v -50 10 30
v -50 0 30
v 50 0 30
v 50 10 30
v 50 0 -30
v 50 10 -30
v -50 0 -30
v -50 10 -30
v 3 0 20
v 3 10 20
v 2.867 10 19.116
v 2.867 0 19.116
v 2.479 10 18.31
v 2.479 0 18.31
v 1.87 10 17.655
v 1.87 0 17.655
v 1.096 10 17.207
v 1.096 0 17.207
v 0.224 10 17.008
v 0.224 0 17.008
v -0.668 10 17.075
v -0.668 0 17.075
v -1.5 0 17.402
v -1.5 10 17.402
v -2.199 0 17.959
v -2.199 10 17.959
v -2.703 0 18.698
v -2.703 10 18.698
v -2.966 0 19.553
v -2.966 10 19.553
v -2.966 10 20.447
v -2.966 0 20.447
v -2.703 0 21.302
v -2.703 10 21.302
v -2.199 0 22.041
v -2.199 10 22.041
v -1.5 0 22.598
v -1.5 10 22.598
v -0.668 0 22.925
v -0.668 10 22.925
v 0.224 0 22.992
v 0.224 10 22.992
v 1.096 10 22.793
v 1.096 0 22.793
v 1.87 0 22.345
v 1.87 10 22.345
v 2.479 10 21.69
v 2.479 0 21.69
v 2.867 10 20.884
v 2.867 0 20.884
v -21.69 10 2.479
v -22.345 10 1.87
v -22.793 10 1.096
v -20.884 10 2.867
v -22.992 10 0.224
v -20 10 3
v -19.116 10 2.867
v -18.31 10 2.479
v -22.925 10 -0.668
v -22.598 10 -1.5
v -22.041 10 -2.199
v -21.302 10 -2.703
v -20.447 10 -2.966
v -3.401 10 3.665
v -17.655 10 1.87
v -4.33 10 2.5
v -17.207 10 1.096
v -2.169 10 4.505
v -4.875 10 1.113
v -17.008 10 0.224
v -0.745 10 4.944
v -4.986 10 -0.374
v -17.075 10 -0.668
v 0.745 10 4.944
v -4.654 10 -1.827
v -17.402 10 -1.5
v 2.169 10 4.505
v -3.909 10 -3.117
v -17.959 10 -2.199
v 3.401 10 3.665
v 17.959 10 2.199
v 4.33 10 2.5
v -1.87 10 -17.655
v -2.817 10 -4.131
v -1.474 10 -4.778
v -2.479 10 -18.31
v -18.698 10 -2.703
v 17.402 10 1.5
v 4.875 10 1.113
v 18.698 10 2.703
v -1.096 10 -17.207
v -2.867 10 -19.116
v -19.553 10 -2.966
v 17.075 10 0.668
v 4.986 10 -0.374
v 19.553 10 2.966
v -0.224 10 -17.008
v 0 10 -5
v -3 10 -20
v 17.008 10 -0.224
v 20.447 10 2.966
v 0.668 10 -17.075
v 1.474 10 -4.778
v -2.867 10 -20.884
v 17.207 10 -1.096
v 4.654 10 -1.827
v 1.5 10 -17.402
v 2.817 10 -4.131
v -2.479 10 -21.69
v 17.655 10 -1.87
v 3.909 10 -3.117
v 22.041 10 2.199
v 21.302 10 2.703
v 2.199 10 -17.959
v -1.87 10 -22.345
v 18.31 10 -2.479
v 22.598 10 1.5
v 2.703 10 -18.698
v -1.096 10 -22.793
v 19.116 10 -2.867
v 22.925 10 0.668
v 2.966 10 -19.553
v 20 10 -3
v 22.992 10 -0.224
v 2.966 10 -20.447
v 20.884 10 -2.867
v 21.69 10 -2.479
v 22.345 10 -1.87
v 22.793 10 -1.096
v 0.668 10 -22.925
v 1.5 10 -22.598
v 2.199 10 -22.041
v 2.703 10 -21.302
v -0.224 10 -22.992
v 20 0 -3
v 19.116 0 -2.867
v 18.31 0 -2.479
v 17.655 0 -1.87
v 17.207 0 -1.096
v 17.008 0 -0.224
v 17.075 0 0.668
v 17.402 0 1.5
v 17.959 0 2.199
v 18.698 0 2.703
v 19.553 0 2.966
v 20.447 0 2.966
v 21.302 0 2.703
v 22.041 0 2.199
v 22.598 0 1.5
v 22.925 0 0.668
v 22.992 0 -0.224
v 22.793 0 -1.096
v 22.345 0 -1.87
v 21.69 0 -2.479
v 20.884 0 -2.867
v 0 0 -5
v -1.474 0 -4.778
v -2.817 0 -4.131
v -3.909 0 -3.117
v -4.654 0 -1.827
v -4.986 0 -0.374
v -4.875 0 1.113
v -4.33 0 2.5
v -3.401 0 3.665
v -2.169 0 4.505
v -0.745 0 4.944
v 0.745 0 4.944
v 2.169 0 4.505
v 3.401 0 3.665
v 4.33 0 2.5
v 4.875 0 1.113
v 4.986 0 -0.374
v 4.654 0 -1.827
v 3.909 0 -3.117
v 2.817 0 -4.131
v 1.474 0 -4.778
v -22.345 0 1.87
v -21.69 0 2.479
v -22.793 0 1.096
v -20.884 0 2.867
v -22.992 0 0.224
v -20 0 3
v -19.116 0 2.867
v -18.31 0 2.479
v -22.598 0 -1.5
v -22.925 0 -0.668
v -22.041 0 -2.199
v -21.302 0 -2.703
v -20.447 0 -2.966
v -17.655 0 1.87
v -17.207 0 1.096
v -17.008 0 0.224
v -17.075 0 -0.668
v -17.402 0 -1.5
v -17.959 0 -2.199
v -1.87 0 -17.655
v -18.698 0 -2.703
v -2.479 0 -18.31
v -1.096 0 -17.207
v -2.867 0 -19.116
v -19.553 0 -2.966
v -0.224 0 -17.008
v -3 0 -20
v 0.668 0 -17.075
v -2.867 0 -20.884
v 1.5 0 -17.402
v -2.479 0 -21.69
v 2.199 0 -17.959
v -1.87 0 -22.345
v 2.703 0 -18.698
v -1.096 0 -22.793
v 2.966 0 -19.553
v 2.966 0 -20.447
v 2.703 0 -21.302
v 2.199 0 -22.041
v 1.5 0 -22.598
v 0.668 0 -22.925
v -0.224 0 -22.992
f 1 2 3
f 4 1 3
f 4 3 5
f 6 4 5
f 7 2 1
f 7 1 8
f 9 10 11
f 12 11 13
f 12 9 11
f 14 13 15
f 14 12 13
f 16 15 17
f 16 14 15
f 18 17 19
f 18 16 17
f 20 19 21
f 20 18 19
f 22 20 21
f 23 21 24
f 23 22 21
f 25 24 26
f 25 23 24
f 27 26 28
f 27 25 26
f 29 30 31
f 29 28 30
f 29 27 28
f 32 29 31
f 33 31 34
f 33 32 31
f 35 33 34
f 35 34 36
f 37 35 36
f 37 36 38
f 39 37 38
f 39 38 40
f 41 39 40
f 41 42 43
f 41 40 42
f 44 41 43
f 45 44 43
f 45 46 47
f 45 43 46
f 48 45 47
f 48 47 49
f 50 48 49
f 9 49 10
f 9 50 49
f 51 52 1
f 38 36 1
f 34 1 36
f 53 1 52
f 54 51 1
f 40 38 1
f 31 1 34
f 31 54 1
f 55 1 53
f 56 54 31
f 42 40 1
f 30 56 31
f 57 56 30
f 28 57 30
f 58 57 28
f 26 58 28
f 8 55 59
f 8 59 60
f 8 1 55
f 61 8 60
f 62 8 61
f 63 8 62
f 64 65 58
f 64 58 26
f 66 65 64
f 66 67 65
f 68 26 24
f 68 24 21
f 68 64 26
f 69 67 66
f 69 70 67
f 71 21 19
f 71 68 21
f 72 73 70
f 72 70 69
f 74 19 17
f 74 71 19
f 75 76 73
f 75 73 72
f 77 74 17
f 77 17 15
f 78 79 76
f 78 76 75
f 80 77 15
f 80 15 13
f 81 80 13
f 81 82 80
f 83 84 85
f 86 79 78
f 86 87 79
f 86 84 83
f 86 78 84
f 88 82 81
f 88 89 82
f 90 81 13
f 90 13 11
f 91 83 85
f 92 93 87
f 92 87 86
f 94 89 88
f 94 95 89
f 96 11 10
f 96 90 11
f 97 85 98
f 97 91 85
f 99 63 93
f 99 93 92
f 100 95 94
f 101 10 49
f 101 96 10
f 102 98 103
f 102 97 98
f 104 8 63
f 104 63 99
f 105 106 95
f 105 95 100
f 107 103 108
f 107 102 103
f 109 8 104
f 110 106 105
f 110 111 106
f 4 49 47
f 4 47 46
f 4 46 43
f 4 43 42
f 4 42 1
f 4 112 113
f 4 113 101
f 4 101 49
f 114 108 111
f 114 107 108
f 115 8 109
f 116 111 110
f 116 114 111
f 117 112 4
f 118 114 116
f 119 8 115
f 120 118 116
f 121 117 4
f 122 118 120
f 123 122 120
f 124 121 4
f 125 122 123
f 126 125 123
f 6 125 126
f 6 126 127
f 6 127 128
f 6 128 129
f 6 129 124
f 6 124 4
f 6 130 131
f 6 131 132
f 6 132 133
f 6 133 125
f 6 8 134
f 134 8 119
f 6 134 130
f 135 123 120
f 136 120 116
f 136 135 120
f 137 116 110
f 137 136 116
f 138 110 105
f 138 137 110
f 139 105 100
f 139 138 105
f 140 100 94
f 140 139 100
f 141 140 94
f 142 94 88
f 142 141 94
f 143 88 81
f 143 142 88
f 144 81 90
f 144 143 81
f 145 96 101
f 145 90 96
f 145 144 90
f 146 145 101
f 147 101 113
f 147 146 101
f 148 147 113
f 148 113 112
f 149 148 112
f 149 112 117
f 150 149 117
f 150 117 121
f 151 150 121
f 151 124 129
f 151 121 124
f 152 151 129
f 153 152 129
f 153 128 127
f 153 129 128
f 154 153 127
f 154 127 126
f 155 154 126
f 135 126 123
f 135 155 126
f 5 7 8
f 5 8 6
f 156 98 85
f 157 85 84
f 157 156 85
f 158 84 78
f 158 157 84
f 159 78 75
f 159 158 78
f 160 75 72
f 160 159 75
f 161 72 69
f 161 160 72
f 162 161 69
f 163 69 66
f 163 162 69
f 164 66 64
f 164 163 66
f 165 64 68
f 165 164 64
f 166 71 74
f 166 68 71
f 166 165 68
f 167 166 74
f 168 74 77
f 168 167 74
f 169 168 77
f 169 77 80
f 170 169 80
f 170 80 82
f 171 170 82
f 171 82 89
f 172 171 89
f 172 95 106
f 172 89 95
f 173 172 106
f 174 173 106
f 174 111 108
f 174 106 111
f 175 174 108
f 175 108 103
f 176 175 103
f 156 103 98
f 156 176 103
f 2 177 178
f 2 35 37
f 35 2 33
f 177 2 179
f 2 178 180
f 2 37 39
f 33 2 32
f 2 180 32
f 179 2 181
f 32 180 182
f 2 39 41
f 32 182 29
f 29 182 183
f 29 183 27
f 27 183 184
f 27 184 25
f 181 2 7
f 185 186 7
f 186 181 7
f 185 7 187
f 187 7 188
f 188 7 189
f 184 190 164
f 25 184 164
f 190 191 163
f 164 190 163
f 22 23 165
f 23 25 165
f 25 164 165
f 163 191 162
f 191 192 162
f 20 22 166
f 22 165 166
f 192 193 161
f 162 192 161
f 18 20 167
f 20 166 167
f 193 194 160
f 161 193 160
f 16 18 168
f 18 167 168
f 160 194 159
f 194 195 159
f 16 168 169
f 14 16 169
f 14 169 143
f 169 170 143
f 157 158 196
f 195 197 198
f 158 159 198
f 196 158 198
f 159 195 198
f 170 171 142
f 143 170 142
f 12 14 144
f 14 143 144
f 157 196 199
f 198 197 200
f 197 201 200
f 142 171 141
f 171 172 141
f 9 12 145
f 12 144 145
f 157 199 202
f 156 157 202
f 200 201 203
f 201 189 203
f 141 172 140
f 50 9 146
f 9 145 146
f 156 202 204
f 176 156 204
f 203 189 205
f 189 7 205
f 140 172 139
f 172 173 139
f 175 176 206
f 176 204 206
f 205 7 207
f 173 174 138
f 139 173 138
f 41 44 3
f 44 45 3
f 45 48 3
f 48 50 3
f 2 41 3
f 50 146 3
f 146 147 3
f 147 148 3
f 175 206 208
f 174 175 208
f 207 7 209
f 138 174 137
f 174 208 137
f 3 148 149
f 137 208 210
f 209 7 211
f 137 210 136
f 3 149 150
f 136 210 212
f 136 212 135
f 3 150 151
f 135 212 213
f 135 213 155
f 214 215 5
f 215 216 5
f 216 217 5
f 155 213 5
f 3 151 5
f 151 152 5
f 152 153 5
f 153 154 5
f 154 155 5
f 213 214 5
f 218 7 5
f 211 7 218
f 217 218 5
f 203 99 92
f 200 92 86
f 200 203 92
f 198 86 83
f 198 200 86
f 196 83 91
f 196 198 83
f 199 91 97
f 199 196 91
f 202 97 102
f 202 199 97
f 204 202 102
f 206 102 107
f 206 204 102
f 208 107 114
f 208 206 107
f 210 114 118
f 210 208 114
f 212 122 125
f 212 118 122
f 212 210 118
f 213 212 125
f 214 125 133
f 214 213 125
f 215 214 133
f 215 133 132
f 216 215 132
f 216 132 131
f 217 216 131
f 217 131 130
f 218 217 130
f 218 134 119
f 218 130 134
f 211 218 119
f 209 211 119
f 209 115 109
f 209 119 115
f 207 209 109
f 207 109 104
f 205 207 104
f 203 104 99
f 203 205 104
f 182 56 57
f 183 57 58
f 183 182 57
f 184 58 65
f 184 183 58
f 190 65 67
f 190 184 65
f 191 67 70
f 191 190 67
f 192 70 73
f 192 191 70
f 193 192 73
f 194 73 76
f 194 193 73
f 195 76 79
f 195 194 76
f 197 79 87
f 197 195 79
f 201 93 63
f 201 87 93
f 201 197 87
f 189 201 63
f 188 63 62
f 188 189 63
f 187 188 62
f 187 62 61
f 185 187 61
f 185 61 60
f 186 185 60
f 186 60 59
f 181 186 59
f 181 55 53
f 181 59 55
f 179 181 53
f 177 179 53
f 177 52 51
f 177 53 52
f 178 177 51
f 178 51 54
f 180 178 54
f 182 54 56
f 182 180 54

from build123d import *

# Parameters (mm, degrees)
SKETCH_1_W               = 100
SKETCH_1_H               = 60
EXTRUDE_1_DEPTH          = 10
SKETCH_2_R               = 5
CUT_EXTRUDE_1_DEPTH      = 20
SKETCH_3_R               = 3
CUT_EXTRUDE_2_DEPTH      = 20
PATTERN_CIRCULAR_1_COUNT = 4


with BuildPart() as part:
    # 草图1 → 凸台-拉伸1 (new body)
    with BuildSketch(Plane(origin=(0, 0, 0), x_dir=(1, 0, 0), z_dir=(0, 1, 0))):
        Rectangle(SKETCH_1_W, SKETCH_1_H)
    extrude(amount=EXTRUDE_1_DEPTH)

    # 草图2 → 切除-拉伸1 (cut)
    with BuildSketch(Plane(origin=(0, 0, 0), x_dir=(1, 0, 0), z_dir=(0, 1, 0))):
        with Locations(Location((0, 0, 0), (0, 0, 90))):
            Circle(SKETCH_2_R)
    extrude(amount=CUT_EXTRUDE_1_DEPTH, mode=Mode.SUBTRACT)

    # 草图3 → 切除-拉伸2 (cut)
    with BuildSketch(Plane(origin=(0, 0, 0), x_dir=(1, 0, 0), z_dir=(0, 1, 0))):
        with Locations(Location((20, 0, 0), (0, 0, 90))):
            Circle(SKETCH_3_R)
    cut_extrude_2 = extrude(amount=CUT_EXTRUDE_2_DEPTH, mode=Mode.SUBTRACT)

    # 阵列(圆周)1: 切除-拉伸2 ×4 about axis
    pattern_circular_1_axis = Axis((0, 0, 0), (0, 1, 0))
    for i in range(1, PATTERN_CIRCULAR_1_COUNT):
        add(cut_extrude_2.rotate(pattern_circular_1_axis, i * 360 / PATTERN_CIRCULAR_1_COUNT), mode=Mode.SUBTRACT)


solid = part.part
